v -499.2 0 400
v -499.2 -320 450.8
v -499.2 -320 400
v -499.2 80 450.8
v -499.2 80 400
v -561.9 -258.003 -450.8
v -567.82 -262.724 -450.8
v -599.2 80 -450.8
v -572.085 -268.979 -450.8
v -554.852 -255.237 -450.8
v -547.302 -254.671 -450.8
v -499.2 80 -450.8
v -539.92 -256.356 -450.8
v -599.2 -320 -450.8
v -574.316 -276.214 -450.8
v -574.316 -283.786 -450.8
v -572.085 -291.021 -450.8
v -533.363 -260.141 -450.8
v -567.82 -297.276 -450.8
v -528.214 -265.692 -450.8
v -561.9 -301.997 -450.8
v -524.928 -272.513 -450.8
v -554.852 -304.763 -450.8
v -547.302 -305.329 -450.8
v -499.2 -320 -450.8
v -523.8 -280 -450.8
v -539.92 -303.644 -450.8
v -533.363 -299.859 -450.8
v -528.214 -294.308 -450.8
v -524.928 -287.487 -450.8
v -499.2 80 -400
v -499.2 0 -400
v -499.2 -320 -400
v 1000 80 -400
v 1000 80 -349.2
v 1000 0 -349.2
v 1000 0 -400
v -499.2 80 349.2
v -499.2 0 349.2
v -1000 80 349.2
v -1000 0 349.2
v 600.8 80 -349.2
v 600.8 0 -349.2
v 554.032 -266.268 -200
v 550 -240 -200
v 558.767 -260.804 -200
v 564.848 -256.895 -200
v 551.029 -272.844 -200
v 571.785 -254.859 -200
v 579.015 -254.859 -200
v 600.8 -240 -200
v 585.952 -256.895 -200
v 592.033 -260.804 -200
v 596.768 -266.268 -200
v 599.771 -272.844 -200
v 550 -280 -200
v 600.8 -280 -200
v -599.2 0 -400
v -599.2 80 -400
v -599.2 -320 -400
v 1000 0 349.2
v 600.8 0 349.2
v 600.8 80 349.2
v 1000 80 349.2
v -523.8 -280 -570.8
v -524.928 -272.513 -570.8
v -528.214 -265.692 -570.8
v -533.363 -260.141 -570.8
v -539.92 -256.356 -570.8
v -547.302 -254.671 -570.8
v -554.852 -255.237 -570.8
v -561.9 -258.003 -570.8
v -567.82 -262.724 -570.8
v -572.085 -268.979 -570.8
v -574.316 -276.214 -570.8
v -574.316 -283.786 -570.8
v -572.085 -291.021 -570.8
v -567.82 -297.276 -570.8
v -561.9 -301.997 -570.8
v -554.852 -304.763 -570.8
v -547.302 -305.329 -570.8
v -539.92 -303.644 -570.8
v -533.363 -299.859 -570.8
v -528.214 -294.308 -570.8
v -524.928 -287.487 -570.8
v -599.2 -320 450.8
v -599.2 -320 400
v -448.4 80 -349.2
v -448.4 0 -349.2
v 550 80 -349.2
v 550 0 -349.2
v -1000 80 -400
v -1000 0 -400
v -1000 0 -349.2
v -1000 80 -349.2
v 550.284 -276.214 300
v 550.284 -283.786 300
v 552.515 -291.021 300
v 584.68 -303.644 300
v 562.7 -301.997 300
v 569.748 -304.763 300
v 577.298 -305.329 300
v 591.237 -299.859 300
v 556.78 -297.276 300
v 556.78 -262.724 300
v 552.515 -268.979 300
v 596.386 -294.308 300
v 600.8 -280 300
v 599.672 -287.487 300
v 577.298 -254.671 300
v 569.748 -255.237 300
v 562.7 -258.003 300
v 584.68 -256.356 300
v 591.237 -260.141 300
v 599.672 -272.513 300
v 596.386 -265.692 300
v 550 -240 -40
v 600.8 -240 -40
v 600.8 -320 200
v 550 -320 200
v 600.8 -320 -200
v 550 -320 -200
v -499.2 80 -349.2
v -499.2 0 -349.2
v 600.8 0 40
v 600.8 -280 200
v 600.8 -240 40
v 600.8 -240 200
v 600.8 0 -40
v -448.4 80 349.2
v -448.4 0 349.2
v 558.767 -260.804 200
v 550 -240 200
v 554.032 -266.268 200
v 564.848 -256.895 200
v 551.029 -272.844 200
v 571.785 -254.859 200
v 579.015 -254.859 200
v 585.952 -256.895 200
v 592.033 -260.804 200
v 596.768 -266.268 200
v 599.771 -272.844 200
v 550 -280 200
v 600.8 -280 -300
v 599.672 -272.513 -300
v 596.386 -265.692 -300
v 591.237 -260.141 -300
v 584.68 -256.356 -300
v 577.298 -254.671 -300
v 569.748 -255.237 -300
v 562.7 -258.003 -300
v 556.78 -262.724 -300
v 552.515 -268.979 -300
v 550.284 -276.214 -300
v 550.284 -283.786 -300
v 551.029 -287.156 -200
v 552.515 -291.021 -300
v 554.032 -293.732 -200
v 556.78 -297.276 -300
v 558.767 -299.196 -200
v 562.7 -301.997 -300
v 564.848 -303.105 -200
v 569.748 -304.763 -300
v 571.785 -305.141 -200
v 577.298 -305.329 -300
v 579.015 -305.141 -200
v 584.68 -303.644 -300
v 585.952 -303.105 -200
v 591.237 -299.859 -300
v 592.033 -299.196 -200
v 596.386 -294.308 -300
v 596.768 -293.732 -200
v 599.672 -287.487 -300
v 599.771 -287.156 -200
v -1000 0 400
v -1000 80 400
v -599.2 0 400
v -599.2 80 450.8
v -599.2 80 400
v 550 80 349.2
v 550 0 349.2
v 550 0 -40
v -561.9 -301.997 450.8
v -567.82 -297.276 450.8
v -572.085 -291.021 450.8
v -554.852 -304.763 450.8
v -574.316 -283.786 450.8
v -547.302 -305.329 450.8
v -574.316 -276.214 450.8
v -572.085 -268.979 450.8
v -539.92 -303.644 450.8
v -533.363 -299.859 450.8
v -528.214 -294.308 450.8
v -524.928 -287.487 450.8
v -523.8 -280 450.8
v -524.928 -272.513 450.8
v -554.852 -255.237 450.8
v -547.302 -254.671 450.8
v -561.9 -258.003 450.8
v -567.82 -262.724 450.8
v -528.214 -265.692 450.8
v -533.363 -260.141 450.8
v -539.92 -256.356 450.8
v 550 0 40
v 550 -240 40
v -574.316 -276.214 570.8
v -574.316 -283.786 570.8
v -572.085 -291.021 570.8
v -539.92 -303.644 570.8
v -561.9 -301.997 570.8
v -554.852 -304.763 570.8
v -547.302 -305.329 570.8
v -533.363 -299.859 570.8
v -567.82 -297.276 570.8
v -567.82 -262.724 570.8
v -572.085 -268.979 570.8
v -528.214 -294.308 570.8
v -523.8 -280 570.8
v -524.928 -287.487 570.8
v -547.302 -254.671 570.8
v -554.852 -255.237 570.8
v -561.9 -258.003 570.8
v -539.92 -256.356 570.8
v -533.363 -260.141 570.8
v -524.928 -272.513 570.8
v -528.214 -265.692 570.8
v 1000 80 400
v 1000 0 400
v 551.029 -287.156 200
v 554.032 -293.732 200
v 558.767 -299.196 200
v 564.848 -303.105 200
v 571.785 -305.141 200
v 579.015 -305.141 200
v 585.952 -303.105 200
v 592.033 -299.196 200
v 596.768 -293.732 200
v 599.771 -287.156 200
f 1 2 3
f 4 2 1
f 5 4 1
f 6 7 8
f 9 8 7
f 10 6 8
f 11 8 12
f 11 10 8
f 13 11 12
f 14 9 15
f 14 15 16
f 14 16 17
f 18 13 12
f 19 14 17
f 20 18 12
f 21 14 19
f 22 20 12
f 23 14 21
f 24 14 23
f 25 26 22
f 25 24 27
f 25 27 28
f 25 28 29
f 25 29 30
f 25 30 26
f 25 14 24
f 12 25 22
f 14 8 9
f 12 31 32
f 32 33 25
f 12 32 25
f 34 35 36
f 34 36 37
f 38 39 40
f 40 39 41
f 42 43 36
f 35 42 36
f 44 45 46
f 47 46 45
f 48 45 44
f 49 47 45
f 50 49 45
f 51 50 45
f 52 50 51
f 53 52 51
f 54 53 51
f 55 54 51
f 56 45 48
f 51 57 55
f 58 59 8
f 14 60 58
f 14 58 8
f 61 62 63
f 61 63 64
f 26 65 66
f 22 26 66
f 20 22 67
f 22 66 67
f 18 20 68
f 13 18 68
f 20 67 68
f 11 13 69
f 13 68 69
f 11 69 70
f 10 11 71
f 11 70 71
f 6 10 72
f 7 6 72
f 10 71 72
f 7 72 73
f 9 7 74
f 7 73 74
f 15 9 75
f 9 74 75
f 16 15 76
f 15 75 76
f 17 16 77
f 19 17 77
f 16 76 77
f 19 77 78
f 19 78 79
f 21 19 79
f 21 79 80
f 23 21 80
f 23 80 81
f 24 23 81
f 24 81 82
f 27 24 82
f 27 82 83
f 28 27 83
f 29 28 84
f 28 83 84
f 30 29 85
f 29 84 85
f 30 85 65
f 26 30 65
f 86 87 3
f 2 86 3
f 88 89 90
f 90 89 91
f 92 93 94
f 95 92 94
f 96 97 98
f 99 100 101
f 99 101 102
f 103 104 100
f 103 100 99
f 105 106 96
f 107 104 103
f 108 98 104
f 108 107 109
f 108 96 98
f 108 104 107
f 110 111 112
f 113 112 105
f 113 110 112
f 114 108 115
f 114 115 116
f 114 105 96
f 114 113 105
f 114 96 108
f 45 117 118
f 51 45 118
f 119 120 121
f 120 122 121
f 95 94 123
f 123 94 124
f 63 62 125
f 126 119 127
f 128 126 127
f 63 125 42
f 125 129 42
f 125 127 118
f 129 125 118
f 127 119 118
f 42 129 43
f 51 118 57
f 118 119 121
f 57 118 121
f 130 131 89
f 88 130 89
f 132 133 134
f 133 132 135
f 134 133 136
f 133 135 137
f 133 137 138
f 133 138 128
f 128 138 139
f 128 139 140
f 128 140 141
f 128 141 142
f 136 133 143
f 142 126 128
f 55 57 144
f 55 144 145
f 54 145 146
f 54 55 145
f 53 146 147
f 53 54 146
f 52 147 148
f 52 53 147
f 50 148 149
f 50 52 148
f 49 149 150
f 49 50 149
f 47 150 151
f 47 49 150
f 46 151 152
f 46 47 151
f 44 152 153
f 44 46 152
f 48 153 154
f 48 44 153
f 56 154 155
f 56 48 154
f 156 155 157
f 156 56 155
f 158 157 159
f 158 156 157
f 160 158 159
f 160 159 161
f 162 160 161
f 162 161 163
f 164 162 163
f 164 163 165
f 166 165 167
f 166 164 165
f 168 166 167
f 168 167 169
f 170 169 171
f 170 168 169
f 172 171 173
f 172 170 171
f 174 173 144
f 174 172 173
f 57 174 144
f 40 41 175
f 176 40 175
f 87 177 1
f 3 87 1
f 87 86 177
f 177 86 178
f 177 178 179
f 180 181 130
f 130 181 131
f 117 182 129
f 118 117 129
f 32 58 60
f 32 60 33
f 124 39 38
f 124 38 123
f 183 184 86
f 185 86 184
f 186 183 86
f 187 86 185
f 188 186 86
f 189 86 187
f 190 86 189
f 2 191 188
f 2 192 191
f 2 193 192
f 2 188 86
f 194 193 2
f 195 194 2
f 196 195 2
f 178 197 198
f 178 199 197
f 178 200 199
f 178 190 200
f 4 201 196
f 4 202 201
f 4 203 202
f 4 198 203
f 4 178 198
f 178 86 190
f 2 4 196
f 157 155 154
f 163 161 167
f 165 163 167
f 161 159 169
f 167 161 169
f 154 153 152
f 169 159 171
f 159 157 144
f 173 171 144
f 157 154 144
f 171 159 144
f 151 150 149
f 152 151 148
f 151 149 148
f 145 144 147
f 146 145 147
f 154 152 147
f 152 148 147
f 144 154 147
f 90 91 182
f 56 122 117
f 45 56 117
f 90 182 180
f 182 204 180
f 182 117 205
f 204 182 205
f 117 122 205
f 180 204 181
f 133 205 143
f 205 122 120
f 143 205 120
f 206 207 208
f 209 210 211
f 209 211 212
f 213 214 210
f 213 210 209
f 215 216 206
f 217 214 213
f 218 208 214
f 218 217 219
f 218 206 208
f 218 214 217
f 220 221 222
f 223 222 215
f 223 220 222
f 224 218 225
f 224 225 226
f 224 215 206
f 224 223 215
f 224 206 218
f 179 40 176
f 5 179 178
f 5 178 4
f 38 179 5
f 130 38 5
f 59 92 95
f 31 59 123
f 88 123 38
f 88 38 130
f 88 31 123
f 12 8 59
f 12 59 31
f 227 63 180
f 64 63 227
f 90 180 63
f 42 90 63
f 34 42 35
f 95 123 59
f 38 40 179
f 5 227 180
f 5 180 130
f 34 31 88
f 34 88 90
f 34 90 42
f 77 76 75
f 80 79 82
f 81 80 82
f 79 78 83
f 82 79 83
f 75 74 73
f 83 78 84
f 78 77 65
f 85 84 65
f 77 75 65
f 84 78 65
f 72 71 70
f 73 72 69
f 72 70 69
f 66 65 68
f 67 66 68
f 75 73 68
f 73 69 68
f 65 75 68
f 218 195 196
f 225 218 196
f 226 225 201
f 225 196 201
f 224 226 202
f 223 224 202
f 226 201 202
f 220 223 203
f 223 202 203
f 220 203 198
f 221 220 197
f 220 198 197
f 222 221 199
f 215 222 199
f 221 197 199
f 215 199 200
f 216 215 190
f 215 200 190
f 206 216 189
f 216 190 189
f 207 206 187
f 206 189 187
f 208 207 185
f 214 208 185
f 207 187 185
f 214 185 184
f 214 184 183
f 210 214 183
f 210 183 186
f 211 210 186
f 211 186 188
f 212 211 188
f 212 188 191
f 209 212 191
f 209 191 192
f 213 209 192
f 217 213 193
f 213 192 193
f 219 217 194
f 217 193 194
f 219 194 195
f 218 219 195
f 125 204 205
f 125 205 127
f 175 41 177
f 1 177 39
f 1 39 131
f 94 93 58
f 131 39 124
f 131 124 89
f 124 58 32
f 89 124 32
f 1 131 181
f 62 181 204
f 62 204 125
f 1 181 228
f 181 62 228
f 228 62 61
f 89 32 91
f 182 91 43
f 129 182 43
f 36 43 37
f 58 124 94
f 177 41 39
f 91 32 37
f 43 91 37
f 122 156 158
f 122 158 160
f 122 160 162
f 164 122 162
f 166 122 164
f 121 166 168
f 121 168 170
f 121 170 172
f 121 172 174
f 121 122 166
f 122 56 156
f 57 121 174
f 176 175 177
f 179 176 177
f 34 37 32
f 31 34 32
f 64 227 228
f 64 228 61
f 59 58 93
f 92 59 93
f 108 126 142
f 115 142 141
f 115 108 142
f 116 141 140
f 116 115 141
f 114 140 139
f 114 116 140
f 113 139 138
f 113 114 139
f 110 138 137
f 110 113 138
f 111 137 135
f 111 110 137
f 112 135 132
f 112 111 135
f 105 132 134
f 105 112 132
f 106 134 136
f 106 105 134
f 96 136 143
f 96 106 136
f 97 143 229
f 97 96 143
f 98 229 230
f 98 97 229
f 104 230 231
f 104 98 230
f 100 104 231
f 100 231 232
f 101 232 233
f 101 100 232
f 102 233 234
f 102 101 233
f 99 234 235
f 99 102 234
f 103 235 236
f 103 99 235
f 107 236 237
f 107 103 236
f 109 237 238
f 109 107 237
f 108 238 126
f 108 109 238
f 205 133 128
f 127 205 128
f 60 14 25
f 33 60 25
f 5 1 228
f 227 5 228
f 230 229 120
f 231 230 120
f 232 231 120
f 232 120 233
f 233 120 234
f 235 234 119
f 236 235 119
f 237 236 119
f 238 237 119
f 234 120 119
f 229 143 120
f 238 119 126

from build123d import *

# Parameters (mm, degrees)
CROQUIS1_W              = 50.8
CROQUIS1_H              = 50.8
CROQUIS1_W_2            = 399.2
CROQUIS1_H_2            = 149.2
CROQUIS1_H_3            = 160
CROQUIS1_H_4            = 80
CROQUIS1_H_5            = 698.4
CROQUIS1_W_3            = 100
SALIENTE_EXTRUIR1_DEPTH = 80
CROQUIS1_4_W            = 100
CROQUIS1_4_H            = 50.8
CROQUIS1_4_W_2          = 50.8
CROQUIS1_4_H_2          = 80
SALIENTE_EXTRUIR2_DEPTH = 320
SALIENTE_EXTRUIR3_START = -320
CROQUIS1_5_W            = 50.8
CROQUIS1_5_H            = 160
CROQUIS1_5_H_2          = 80
SALIENTE_EXTRUIR3_DEPTH = 80
SALIENTE_EXTRUIR4_START = 450.8
CROQUIS2_R              = 25.4
SALIENTE_EXTRUIR4_DEPTH = 120
SALIENTE_EXTRUIR5_START = -570.8
CROQUIS2_7_R            = 25.4
SALIENTE_EXTRUIR5_DEPTH = 120
CROQUIS2_8_R            = 25.4
SALIENTE_EXTRUIR6_DEPTH = 300


with BuildPart() as part:
    # Croquis1 → Saliente-Extruir1 (new body)
    with BuildSketch(Plane(origin=(0, 0, 0), x_dir=(1, 0, 0), z_dir=(0, 1, 0))):
        Polygon((-1000, 400), (-1000, 349.2), (-499.2, 349.2), (-499.2, 400), (-599.2, 400), align=None)
        with Locations((-473.8, 374.6)):
            Rectangle(CROQUIS1_W, CROQUIS1_H)
        Polygon((-448.4, 400), (-448.4, 349.2), (0, 349.2), (550, 349.2), (550, 400), align=None)
        with Locations((800.4, 374.6)):
            Rectangle(CROQUIS1_W_2, CROQUIS1_H)
        with Locations((575.4, 374.6)):
            Rectangle(CROQUIS1_W, CROQUIS1_H)
        with Locations((575.4, 274.6)):
            Rectangle(CROQUIS1_W, CROQUIS1_H_2)
        with Locations((575.4, 120)):
            Rectangle(CROQUIS1_W, CROQUIS1_H_3)
        with Locations((575.4, 0)):
            Rectangle(CROQUIS1_W, CROQUIS1_H_4)
        with Locations((575.4, -120)):
            Rectangle(CROQUIS1_W, CROQUIS1_H_3)
        with Locations((575.4, -274.6)):
            Rectangle(CROQUIS1_W, CROQUIS1_H_2)
        with Locations((575.4, -374.6)):
            Rectangle(CROQUIS1_W, CROQUIS1_H)
        with Locations((800.4, -374.6)):
            Rectangle(CROQUIS1_W_2, CROQUIS1_H)
        Polygon((0, -349.2), (-448.4, -349.2), (-448.4, -400), (550, -400), (550, -349.2), align=None)
        with Locations((-473.8, -374.6)):
            Rectangle(CROQUIS1_W, CROQUIS1_H)
        Polygon((-499.2, -400), (-499.2, -349.2), (-1000, -349.2), (-1000, -400), (-599.2, -400), align=None)
        with Locations((-473.8, 0)):
            Rectangle(CROQUIS1_W, CROQUIS1_H_5)
        with Locations((-549.2, 425.4)):
            Rectangle(CROQUIS1_W_3, CROQUIS1_H)
        with Locations((-549.2, -425.4)):
            Rectangle(CROQUIS1_W_3, CROQUIS1_H)
    extrude(amount=SALIENTE_EXTRUIR1_DEPTH)

    # Croquis1<4> → Saliente-Extruir2 (add)
    with BuildSketch(Plane(origin=(0, 0, 0), x_dir=(1, 0, 0), z_dir=(0, 1, 0))):
        with Locations((-549.2, -425.4)):
            Rectangle(CROQUIS1_4_W, CROQUIS1_4_H)
        with Locations((-549.2, 425.4)):
            Rectangle(CROQUIS1_4_W, CROQUIS1_4_H)
        with Locations((575.4, 0)):
            Rectangle(CROQUIS1_4_W_2, CROQUIS1_4_H_2)
    extrude(amount=-SALIENTE_EXTRUIR2_DEPTH)

    # Croquis1<5> → Saliente-Extruir3 (add)
    with BuildSketch(Plane(origin=(0, 0, 0), x_dir=(1, 0, 0), z_dir=(0, 1, 0)).offset(SALIENTE_EXTRUIR3_START)):
        with Locations((575.4, -120)):
            Rectangle(CROQUIS1_5_W, CROQUIS1_5_H)
        with Locations((575.4, 0)):
            Rectangle(CROQUIS1_5_W, CROQUIS1_5_H_2)
        with Locations((575.4, 120)):
            Rectangle(CROQUIS1_5_W, CROQUIS1_5_H)
    extrude(amount=SALIENTE_EXTRUIR3_DEPTH)

    # Croquis2 → Saliente-Extruir4 (add)
    with BuildSketch(Plane.XY.offset(SALIENTE_EXTRUIR4_START)):
        with Locations((-549.2, -280)):
            Circle(CROQUIS2_R)
    extrude(amount=SALIENTE_EXTRUIR4_DEPTH)

    # Croquis2<7> → Saliente-Extruir5 (add)
    with BuildSketch(Plane.XY.offset(SALIENTE_EXTRUIR5_START)):
        with Locations((-549.2, -280)):
            Circle(CROQUIS2_7_R)
    extrude(amount=SALIENTE_EXTRUIR5_DEPTH)

    # Croquis2<8> → Saliente-Extruir6 (add, symmetric)
    with BuildSketch(Plane.XY):
        with Locations((575.4, -280)):
            Circle(CROQUIS2_8_R)
    extrude(amount=SALIENTE_EXTRUIR6_DEPTH, both=True)


solid = part.part
